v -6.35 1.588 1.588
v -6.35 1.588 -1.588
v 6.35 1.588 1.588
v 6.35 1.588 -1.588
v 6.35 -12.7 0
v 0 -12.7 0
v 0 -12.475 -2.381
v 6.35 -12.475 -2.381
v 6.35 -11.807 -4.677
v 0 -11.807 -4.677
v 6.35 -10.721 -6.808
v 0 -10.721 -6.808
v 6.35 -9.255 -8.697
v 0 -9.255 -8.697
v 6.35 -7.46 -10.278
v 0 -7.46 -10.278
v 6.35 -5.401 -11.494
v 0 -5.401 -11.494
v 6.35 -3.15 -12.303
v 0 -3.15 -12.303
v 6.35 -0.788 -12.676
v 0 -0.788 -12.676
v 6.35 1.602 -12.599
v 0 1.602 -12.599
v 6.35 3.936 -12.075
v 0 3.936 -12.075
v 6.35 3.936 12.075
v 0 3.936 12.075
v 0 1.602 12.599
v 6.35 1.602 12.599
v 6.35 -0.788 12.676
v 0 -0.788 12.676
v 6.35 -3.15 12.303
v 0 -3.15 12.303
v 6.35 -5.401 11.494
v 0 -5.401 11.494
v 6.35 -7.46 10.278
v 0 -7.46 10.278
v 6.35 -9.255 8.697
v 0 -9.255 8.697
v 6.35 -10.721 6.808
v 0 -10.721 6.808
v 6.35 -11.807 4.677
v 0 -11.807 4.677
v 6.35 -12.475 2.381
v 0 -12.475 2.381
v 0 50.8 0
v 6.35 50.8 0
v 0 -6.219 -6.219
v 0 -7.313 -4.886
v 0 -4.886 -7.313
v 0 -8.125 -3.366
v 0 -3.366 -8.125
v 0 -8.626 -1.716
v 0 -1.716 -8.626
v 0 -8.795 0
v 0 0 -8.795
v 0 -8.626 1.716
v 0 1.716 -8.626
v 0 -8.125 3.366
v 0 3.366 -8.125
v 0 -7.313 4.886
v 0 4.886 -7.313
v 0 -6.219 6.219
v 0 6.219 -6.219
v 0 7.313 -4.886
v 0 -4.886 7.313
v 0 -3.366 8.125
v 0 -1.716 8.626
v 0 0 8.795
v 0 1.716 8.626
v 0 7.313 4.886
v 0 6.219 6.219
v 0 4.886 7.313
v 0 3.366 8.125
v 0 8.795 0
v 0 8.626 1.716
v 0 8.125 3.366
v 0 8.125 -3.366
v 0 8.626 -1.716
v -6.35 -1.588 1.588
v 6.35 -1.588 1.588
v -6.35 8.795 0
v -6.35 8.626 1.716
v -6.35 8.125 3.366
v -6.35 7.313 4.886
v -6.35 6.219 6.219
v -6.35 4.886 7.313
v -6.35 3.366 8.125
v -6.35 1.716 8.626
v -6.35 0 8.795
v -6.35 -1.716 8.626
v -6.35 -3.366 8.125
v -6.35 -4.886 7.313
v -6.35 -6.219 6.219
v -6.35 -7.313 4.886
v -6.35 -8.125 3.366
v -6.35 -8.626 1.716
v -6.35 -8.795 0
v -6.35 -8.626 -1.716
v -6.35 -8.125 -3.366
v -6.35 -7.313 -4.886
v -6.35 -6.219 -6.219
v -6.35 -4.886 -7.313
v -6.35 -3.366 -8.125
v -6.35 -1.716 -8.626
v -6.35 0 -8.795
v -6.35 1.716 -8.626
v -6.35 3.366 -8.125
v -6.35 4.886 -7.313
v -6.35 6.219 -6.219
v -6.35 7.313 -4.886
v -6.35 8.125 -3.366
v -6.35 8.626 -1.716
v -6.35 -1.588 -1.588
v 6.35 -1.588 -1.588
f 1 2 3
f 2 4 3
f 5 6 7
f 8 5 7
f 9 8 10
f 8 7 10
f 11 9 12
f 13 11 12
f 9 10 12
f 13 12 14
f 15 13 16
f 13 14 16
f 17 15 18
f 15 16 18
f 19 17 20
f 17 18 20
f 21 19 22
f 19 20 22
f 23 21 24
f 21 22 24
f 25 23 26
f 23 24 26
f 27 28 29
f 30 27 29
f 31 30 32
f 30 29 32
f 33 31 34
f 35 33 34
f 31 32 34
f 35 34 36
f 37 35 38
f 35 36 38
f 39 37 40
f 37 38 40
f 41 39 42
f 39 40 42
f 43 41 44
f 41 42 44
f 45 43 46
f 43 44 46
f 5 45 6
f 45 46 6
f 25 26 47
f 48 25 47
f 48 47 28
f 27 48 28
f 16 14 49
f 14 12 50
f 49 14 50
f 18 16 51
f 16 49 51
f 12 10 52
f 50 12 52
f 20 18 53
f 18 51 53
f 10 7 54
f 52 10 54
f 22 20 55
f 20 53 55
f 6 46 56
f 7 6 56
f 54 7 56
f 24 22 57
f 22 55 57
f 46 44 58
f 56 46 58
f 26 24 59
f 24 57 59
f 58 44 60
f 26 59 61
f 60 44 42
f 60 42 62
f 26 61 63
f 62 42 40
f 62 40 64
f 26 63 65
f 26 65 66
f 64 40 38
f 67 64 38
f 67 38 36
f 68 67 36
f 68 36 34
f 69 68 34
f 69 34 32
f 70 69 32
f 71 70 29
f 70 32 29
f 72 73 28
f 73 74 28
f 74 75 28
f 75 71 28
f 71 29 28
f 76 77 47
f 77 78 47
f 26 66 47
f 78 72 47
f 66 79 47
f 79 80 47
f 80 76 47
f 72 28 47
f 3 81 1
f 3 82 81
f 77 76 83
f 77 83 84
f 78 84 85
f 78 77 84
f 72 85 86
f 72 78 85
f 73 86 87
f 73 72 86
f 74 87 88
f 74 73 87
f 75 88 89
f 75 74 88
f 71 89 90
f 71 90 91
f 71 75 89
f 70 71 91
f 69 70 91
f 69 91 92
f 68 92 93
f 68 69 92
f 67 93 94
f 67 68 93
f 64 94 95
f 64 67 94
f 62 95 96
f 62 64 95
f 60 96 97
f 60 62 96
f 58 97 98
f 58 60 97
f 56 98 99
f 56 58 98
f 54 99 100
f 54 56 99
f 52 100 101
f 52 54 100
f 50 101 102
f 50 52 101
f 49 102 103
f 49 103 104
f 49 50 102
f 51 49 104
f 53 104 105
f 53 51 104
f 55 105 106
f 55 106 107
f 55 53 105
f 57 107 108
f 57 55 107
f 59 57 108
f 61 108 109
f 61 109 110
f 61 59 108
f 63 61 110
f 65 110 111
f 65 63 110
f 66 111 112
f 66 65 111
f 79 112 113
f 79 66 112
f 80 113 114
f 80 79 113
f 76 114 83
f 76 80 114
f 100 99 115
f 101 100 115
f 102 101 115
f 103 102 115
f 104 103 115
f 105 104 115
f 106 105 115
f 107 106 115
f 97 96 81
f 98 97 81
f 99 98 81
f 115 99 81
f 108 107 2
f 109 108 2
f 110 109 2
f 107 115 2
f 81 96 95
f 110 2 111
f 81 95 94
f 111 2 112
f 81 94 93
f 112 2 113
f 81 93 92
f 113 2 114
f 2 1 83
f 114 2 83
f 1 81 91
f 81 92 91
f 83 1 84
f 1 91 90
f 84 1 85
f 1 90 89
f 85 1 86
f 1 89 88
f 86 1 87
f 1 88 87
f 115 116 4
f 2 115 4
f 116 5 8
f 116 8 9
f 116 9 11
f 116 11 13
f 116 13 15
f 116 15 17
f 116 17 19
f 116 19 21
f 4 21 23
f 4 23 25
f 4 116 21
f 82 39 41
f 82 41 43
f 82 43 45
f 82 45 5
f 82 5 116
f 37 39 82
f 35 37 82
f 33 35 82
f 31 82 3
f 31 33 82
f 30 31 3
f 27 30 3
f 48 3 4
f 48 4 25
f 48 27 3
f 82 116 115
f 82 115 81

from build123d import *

# Parameters (mm, degrees)
F1_DEPTH = 6.35
F2_W     = 3.175
F2_H     = 3.175
F3_DEPTH = 25.4
F4_R     = 8.794705
F4_W     = 3.175
F4_H     = 3.175
F5_DEPTH = 6.35


with BuildPart() as f1:
    # F0 (on Right) → F1 (new body)
    with BuildSketch(Plane.YZ):
        with BuildLine():
            Line((50.8, 0), (3.935791, 12.074749))
            ThreePointArc((3.935791, 12.074749), (-7.460076, 10.277999), (-12.7, 0))
            ThreePointArc((-12.7, 0), (-7.460076, -10.277999), (3.935791, -12.074749))
            Line((3.935791, -12.074749), (50.8, 0))
        make_face()
    extrude(amount=F1_DEPTH)

    # F2 (on face) → F3 (cut)
    with BuildSketch(Plane.YZ.offset(6.35)):
        Rectangle(F2_W, F2_H)
    extrude(amount=-F3_DEPTH, mode=Mode.SUBTRACT)

    # F4 (on Right) → F5 (join)
    with BuildSketch(Plane.YZ):
        Circle(F4_R)
        Rectangle(F4_W, F4_H, mode=Mode.SUBTRACT)
    extrude(amount=-F5_DEPTH)


solid = f1.part
